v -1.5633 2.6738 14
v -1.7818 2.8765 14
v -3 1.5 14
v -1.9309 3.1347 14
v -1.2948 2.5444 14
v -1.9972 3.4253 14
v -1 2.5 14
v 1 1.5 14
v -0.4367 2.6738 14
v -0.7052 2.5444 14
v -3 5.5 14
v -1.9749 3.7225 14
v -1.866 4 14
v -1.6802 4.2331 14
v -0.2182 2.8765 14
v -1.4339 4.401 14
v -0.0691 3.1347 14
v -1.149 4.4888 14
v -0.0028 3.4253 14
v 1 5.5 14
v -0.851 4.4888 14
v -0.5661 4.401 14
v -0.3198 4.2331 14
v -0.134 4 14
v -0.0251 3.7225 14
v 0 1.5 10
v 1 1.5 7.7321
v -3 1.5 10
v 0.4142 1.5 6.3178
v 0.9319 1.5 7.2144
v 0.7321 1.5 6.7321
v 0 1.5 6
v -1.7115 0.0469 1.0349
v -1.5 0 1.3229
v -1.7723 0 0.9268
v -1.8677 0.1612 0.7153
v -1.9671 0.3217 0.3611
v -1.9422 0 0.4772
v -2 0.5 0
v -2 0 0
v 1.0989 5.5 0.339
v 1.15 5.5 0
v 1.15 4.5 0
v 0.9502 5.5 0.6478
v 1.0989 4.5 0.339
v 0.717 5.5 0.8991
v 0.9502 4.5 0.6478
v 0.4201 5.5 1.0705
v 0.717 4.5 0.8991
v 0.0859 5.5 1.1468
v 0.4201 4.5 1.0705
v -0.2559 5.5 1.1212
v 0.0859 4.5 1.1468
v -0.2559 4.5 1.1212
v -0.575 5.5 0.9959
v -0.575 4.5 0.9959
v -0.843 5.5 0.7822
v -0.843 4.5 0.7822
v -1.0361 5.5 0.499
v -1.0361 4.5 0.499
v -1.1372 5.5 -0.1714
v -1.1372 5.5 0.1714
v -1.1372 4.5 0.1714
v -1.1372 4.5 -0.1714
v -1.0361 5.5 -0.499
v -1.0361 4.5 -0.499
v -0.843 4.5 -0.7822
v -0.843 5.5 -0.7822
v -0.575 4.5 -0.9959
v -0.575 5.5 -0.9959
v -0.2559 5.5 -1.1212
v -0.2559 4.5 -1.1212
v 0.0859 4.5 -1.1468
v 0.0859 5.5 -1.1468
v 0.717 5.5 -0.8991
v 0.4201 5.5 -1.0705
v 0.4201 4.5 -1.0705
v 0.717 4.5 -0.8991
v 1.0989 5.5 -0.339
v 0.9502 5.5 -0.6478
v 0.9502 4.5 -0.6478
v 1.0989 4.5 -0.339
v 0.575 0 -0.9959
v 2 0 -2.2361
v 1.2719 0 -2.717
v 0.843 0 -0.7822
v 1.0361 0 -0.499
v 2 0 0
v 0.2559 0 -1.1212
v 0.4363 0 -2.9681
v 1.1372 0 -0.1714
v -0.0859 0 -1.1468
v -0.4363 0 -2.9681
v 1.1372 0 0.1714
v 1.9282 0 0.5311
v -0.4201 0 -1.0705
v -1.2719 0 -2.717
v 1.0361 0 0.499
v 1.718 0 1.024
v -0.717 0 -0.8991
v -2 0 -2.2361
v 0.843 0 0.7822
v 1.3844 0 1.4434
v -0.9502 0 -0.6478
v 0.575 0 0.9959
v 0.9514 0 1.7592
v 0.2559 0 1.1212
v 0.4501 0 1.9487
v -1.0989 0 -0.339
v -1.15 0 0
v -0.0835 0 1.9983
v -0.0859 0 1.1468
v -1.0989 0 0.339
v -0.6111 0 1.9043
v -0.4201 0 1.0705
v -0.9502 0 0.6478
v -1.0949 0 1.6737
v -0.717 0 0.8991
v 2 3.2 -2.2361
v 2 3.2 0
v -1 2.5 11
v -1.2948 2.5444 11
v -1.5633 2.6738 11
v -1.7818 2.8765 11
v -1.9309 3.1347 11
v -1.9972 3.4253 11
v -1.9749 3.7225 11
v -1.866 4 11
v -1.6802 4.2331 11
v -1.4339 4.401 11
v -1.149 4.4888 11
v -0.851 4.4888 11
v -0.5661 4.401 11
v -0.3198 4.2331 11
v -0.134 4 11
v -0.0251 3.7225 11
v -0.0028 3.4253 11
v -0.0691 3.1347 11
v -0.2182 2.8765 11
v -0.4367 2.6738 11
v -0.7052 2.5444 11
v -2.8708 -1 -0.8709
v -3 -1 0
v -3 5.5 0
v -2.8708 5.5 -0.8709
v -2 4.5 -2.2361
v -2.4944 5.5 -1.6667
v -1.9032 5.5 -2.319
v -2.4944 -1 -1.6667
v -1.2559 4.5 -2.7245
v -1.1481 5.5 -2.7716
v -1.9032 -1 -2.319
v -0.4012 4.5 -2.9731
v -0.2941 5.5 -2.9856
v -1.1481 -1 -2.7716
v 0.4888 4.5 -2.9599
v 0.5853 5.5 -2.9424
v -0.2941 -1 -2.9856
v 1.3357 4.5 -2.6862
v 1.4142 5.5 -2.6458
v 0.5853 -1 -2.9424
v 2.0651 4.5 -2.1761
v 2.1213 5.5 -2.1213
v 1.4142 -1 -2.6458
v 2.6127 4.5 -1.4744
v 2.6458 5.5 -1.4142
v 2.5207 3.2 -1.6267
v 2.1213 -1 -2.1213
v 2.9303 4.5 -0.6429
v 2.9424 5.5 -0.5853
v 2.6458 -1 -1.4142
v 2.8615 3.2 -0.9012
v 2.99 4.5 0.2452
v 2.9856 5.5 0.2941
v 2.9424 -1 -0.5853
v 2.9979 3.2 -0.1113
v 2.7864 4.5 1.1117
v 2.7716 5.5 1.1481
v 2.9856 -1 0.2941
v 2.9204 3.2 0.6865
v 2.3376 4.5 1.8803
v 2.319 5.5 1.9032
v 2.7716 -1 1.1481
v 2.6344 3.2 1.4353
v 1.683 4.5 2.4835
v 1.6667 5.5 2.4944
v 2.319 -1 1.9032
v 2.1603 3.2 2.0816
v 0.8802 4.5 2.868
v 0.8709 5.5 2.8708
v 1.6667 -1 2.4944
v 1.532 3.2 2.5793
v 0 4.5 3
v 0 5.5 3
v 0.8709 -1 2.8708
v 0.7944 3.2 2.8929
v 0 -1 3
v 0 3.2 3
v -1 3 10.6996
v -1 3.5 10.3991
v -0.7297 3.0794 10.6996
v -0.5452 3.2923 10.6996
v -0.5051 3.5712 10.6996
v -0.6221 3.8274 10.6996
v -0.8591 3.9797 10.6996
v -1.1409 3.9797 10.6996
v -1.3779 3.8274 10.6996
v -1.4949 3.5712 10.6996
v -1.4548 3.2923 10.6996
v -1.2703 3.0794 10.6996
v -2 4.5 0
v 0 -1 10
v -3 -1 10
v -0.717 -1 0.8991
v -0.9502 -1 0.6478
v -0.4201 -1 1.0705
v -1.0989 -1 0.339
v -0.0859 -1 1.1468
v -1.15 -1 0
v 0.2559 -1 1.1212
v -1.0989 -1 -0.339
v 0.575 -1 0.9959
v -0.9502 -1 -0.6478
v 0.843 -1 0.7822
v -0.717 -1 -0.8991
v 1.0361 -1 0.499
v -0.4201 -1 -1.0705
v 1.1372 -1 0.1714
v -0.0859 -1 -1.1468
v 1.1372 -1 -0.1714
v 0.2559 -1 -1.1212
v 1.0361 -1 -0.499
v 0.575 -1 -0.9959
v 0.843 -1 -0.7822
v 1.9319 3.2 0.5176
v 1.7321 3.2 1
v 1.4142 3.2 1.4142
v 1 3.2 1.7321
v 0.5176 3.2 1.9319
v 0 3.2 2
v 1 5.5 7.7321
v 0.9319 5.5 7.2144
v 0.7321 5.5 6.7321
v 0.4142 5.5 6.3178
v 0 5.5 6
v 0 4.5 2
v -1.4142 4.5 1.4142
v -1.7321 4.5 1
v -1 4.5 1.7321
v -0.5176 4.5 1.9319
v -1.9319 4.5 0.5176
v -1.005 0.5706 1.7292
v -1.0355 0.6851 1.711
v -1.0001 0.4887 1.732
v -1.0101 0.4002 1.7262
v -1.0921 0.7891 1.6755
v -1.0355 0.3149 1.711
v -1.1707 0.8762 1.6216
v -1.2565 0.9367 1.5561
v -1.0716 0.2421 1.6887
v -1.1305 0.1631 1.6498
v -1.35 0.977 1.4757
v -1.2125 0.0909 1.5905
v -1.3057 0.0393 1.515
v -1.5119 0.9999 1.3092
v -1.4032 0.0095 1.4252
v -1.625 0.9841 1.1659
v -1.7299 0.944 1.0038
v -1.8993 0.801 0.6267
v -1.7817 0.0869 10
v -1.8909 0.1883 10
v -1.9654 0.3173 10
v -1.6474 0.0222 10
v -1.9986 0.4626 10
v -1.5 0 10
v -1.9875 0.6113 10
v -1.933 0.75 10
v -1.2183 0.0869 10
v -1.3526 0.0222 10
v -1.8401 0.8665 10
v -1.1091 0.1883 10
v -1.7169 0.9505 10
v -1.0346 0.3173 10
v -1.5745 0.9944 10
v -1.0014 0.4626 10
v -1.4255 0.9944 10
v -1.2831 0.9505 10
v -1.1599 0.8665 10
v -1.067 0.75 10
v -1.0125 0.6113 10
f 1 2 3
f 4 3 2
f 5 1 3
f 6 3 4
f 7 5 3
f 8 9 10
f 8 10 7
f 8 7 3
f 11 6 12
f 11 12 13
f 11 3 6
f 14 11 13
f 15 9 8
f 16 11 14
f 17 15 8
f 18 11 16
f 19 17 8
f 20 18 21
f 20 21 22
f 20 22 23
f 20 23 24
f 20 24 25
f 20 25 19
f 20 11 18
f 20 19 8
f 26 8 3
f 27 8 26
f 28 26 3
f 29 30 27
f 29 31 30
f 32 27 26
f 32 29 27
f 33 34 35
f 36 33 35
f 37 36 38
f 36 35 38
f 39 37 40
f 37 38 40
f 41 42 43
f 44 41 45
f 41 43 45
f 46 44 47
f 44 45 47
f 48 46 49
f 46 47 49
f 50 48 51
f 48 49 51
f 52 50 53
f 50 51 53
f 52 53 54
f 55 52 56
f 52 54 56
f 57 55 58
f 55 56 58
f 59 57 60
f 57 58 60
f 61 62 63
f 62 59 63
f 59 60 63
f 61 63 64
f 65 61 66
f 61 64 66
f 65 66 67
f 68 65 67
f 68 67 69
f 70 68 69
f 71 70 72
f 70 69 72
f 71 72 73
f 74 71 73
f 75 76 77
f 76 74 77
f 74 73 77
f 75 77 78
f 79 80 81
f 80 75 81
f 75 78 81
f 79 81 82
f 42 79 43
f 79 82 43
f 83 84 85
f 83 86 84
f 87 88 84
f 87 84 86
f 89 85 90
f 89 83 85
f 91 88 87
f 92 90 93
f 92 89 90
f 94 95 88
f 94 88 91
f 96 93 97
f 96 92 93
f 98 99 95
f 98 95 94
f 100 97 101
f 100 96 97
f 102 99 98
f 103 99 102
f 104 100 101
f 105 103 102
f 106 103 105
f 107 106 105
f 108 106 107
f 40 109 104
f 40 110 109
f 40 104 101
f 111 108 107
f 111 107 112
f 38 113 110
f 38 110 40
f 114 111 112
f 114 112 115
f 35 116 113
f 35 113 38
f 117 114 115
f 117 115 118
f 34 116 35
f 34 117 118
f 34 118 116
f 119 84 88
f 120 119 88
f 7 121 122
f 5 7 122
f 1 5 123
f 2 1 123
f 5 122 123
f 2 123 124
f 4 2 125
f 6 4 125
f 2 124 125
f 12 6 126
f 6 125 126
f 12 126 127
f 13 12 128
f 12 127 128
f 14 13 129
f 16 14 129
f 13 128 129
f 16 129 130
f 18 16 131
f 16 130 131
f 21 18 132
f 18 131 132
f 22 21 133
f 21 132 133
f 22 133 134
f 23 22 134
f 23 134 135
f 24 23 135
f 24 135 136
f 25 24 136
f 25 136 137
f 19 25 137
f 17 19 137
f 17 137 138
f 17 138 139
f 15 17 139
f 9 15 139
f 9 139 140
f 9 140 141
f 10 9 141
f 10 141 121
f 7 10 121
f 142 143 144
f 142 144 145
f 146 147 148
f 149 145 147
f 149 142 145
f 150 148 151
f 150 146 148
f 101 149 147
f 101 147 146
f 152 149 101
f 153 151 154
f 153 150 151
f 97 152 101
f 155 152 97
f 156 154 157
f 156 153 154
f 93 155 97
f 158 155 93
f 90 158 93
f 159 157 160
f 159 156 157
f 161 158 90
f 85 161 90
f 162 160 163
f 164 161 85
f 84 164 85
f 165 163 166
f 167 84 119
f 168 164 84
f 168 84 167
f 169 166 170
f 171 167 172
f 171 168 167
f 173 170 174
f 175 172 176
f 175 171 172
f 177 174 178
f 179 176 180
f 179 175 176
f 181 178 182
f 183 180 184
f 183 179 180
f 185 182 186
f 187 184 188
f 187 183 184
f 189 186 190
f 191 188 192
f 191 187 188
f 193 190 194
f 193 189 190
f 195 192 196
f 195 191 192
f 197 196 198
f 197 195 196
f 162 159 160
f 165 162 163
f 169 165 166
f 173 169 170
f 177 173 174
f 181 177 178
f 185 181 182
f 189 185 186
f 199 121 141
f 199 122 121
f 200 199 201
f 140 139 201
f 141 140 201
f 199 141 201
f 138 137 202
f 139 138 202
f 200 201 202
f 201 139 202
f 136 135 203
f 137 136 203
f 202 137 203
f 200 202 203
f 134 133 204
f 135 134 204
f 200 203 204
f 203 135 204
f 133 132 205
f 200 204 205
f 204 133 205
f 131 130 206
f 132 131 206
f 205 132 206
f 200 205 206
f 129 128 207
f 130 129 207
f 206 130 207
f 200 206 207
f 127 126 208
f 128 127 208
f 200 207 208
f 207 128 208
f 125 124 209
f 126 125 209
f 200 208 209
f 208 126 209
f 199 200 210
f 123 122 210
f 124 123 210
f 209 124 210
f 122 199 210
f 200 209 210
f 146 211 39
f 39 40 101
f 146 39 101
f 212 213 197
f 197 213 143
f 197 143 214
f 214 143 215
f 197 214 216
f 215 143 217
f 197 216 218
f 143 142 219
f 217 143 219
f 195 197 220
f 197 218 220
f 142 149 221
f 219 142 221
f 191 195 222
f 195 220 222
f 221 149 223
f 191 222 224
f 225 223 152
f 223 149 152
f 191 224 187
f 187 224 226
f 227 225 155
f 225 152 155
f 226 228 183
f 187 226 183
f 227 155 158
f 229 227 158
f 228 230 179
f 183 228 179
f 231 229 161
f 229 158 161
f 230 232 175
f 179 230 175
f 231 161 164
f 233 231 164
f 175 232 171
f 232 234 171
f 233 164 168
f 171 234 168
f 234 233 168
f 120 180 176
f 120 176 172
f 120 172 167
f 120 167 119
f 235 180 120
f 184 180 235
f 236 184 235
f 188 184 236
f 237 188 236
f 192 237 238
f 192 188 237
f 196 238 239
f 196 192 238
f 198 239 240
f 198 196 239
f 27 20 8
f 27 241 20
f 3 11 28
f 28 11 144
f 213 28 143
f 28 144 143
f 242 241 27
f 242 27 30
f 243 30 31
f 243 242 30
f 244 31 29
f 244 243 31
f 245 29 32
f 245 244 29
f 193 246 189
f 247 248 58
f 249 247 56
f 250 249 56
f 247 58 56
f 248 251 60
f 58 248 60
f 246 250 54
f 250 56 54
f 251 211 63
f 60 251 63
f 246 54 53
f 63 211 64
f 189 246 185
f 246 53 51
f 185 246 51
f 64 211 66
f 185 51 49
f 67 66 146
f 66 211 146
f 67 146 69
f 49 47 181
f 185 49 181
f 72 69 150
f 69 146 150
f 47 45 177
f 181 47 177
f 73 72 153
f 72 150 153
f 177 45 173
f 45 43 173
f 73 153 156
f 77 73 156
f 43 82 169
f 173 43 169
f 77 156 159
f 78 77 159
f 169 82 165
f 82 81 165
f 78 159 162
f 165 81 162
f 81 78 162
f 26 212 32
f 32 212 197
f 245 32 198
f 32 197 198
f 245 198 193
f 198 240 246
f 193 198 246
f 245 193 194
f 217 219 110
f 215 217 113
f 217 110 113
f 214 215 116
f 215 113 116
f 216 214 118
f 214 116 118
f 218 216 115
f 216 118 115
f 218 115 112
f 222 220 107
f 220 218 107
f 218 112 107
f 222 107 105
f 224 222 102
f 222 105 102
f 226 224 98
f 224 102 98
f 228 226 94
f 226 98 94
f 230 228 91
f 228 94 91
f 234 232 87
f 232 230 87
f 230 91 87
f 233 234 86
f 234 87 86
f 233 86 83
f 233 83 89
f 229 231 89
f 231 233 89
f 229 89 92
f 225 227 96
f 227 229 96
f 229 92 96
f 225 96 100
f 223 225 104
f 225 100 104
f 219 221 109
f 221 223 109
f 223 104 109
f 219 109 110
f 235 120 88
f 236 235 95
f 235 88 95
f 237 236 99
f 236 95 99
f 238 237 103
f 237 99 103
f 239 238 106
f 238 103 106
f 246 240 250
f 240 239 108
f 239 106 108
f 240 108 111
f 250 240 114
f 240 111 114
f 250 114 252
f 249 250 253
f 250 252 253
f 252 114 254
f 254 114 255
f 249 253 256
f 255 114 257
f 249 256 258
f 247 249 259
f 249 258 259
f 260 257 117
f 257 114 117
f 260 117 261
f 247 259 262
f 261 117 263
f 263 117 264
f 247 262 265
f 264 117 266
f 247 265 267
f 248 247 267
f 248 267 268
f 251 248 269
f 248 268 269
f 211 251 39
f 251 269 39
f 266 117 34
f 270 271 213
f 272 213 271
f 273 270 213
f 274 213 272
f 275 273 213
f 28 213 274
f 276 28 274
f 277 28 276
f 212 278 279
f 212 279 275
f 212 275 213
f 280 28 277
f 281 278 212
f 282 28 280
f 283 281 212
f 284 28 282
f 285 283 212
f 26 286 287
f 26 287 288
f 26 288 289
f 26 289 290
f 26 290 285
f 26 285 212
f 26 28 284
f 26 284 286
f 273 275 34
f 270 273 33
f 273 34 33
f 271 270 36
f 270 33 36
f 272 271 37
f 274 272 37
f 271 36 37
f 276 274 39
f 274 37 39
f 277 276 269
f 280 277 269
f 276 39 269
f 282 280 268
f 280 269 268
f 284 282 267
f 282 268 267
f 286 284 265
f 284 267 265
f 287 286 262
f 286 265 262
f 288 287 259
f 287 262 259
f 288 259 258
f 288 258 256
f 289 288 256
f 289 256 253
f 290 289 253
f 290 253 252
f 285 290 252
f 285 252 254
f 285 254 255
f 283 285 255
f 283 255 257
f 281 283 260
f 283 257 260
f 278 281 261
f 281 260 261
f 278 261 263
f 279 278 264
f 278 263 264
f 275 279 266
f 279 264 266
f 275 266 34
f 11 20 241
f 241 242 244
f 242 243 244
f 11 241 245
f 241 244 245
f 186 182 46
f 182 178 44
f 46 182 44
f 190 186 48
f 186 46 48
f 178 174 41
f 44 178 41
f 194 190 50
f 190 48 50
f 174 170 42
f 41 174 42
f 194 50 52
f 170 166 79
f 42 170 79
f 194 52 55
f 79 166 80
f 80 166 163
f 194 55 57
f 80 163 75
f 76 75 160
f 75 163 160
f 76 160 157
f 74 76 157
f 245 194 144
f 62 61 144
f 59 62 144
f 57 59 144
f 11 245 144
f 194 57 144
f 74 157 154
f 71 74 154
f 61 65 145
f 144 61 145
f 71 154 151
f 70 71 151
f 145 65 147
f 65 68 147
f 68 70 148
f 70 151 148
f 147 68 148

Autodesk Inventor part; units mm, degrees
ref_plane "YZ Plane" through (0, 0, 0) normal (1, 0, 0) x (0, 1, 0)
ref_plane "XZ Plane" through (0, 0, 0) normal (0, 1, 0) x (-1, 0, 0)
ref_plane "XY Plane" through (0, 0, 0) normal (0, 0, 1) x (1, 0, 0)
sketch "スケッチ1" plane through (0, 0, 0) normal (0, 1, 0) x (-1, 0, 0)
  circle A0 centre (0, 0) radius 1.15
  circle A1 centre (0, 0) radius 2
  circle A2 centre (0, 0) radius 3
  line L0 (0, 0) -> (0, 3)
  line L1 (-2, 0) -> (2, 0)
  line L2 (2, 0) -> (2, -3)
  line L3 (2, -3) -> (-2, -3)
  line L4 (-2, -3) -> (-2, 0)
  line L5 (0, 0) -> (3, 0)
  line L6 (3, 0) -> (3, 3)
  line L7 (3, 3) -> (0, 3)
  line L8 (0, 3) -> (0, 0)
  point P0 (-2, -2.2361)
  point P1 (0, 2)
  point P2 (2, -2.2361)
  dimension "d1" = 4
  dimension "d2" = 6
  dimension "d0" = 2.3
extrude "押し出し1" add sketch "スケッチ1" along normal blind 3.2 contours A1 L4 A2 L0
extrude "押し出し2" add sketch "スケッチ1" along normal blind 4.5 contours L5 A2 L2 | A1 L0 A2 L5 | A2 L7 L6
extrude "押し出し3" add sketch "スケッチ1" against normal blind 1 contours L1 A1 A0 | A0 L0 A1 L1 | A0 L1 A1 L0 | L2 A2 L4 A1 | L5 A2 L2 | A1 L0 A2 L5 | A1 L4 A2 L0 | A2 L7 L6
sketch "スケッチ2" plane through (0, 4.5, 0) normal (0, 1, 0) x (1, 0, 0)
  circle A0 centre (0, 0) radius 1.15
  circle A1 centre (0, 0) radius 2
  circle A2 centre (0, 0) radius 3
  line L0 (0, 0) -> (-3, 0)
  line L1 (-3, 0) -> (-3, -3)
  line L2 (-3, -3) -> (0, -3)
  line L3 (0, -3) -> (0, 0)
  dimension "d9" = 2.3
  dimension "d10" = 4
  dimension "d11" = 6
extrude "押し出し4" add sketch "スケッチ2" along normal blind 1 contours A0 L0 A1 L3 | A0 L3 A1 L0 | L0 A2 L3 A1 | A1 L3 A2 L0 | A2 L2 L1
sketch "スケッチ3" plane through (-3, -1, 3) normal (0, 0, 1) x (1, 0, 0)
  line L0 (0, 6.5) -> (0, 0) projected
  line L1 (3, 5.5) -> (3, 6.5) projected
  line L2 (0, 0) -> (3, 0)
  line L3 (3, 0) -> (3, 6.5)
  line L4 (3, 6.5) -> (0, 6.5)
  line L5 (0, 6.5) -> (0, 0)
  point P0 (3, 1)
extrude "押し出し5" add sketch "スケッチ3" along normal blind 7
sketch "スケッチ4" plane through (-3, -1, 10) normal (0, 0, 1) x (1, 0, 0)
  line L0 (4.15, 0) -> (1.85, 0) projected
  line L1 (3, 0) -> (1.5, 0)
  line L2 (1.5, 0) -> (1.5, 1.5)
  line L3 (1.5, 1.5) -> (3, 1.5)
  line L4 (3, 1.5) -> (3, 0)
  point P0 (3, 1)
  dimension "d16" = 1.5
  dimension "d17" = 1.5
hole "穴1" at (-1.5, 0.5, 10) direction (0, 0, -1) diameter 1 end through all
sketch "スケッチ5" plane through (0, 3.2, 3) normal (1, 0, 0) x (0, 0, -1)
  point P0 (3, -3.2)
sketch "スケッチ7" plane through (0, 5.5, 0) normal (0, 1, 0) x (1, 0, 0)
  line L0 (0, -3) -> (0, -10) projected
  line L1 (0, -10) -> (-3, -10)
  line L2 (-3, -10) -> (-3, -50)
  line L3 (-3, -50) -> (0, -50)
  line L4 (0, -50) -> (0, -10)
  point P0 (0, 0)
  dimension "d33" = 3
  dimension "d34" = 40
sketch "スケッチ8" plane through (-3, -1, 10) normal (0, 0, 1) x (1, 0, 0)
  line L0 (0, 0) -> (0, 6.5) projected
  line L1 (0, 6.5) -> (4, 6.5)
  line L2 (4, 6.5) -> (4, 2.5)
  line L3 (4, 2.5) -> (0, 2.5)
  line L4 (0, 2.5) -> (0, 6.5)
  point P0 (3, 1)
  dimension "d35" = 4
  dimension "d36" = 4
extrude "押し出し7" add sketch "スケッチ8" along normal mid plane 8
sketch "スケッチ9" plane through (-3, -1, 14) normal (0, 0, 1) x (1, 0, 0)
  line L0 (0, 0) -> (0, 6.5) projected
  line L1 (0, 6.5) -> (2, 6.5)
  line L2 (2, 6.5) -> (2, 4.5)
  line L3 (2, 4.5) -> (0, 4.5)
  line L4 (0, 4.5) -> (0, 6.5)
  point P0 (3, 1)
  dimension "d39" = 2
  dimension "d40" = 2
hole "穴2" at (-1, 3.5, 14) direction (0, 0, -1) diameter 2 depth 3 tip angle 118
fillet "フィレット1" radius 2 1 edges at (1, 3.5, 6)
properties part number "srod1.2"
